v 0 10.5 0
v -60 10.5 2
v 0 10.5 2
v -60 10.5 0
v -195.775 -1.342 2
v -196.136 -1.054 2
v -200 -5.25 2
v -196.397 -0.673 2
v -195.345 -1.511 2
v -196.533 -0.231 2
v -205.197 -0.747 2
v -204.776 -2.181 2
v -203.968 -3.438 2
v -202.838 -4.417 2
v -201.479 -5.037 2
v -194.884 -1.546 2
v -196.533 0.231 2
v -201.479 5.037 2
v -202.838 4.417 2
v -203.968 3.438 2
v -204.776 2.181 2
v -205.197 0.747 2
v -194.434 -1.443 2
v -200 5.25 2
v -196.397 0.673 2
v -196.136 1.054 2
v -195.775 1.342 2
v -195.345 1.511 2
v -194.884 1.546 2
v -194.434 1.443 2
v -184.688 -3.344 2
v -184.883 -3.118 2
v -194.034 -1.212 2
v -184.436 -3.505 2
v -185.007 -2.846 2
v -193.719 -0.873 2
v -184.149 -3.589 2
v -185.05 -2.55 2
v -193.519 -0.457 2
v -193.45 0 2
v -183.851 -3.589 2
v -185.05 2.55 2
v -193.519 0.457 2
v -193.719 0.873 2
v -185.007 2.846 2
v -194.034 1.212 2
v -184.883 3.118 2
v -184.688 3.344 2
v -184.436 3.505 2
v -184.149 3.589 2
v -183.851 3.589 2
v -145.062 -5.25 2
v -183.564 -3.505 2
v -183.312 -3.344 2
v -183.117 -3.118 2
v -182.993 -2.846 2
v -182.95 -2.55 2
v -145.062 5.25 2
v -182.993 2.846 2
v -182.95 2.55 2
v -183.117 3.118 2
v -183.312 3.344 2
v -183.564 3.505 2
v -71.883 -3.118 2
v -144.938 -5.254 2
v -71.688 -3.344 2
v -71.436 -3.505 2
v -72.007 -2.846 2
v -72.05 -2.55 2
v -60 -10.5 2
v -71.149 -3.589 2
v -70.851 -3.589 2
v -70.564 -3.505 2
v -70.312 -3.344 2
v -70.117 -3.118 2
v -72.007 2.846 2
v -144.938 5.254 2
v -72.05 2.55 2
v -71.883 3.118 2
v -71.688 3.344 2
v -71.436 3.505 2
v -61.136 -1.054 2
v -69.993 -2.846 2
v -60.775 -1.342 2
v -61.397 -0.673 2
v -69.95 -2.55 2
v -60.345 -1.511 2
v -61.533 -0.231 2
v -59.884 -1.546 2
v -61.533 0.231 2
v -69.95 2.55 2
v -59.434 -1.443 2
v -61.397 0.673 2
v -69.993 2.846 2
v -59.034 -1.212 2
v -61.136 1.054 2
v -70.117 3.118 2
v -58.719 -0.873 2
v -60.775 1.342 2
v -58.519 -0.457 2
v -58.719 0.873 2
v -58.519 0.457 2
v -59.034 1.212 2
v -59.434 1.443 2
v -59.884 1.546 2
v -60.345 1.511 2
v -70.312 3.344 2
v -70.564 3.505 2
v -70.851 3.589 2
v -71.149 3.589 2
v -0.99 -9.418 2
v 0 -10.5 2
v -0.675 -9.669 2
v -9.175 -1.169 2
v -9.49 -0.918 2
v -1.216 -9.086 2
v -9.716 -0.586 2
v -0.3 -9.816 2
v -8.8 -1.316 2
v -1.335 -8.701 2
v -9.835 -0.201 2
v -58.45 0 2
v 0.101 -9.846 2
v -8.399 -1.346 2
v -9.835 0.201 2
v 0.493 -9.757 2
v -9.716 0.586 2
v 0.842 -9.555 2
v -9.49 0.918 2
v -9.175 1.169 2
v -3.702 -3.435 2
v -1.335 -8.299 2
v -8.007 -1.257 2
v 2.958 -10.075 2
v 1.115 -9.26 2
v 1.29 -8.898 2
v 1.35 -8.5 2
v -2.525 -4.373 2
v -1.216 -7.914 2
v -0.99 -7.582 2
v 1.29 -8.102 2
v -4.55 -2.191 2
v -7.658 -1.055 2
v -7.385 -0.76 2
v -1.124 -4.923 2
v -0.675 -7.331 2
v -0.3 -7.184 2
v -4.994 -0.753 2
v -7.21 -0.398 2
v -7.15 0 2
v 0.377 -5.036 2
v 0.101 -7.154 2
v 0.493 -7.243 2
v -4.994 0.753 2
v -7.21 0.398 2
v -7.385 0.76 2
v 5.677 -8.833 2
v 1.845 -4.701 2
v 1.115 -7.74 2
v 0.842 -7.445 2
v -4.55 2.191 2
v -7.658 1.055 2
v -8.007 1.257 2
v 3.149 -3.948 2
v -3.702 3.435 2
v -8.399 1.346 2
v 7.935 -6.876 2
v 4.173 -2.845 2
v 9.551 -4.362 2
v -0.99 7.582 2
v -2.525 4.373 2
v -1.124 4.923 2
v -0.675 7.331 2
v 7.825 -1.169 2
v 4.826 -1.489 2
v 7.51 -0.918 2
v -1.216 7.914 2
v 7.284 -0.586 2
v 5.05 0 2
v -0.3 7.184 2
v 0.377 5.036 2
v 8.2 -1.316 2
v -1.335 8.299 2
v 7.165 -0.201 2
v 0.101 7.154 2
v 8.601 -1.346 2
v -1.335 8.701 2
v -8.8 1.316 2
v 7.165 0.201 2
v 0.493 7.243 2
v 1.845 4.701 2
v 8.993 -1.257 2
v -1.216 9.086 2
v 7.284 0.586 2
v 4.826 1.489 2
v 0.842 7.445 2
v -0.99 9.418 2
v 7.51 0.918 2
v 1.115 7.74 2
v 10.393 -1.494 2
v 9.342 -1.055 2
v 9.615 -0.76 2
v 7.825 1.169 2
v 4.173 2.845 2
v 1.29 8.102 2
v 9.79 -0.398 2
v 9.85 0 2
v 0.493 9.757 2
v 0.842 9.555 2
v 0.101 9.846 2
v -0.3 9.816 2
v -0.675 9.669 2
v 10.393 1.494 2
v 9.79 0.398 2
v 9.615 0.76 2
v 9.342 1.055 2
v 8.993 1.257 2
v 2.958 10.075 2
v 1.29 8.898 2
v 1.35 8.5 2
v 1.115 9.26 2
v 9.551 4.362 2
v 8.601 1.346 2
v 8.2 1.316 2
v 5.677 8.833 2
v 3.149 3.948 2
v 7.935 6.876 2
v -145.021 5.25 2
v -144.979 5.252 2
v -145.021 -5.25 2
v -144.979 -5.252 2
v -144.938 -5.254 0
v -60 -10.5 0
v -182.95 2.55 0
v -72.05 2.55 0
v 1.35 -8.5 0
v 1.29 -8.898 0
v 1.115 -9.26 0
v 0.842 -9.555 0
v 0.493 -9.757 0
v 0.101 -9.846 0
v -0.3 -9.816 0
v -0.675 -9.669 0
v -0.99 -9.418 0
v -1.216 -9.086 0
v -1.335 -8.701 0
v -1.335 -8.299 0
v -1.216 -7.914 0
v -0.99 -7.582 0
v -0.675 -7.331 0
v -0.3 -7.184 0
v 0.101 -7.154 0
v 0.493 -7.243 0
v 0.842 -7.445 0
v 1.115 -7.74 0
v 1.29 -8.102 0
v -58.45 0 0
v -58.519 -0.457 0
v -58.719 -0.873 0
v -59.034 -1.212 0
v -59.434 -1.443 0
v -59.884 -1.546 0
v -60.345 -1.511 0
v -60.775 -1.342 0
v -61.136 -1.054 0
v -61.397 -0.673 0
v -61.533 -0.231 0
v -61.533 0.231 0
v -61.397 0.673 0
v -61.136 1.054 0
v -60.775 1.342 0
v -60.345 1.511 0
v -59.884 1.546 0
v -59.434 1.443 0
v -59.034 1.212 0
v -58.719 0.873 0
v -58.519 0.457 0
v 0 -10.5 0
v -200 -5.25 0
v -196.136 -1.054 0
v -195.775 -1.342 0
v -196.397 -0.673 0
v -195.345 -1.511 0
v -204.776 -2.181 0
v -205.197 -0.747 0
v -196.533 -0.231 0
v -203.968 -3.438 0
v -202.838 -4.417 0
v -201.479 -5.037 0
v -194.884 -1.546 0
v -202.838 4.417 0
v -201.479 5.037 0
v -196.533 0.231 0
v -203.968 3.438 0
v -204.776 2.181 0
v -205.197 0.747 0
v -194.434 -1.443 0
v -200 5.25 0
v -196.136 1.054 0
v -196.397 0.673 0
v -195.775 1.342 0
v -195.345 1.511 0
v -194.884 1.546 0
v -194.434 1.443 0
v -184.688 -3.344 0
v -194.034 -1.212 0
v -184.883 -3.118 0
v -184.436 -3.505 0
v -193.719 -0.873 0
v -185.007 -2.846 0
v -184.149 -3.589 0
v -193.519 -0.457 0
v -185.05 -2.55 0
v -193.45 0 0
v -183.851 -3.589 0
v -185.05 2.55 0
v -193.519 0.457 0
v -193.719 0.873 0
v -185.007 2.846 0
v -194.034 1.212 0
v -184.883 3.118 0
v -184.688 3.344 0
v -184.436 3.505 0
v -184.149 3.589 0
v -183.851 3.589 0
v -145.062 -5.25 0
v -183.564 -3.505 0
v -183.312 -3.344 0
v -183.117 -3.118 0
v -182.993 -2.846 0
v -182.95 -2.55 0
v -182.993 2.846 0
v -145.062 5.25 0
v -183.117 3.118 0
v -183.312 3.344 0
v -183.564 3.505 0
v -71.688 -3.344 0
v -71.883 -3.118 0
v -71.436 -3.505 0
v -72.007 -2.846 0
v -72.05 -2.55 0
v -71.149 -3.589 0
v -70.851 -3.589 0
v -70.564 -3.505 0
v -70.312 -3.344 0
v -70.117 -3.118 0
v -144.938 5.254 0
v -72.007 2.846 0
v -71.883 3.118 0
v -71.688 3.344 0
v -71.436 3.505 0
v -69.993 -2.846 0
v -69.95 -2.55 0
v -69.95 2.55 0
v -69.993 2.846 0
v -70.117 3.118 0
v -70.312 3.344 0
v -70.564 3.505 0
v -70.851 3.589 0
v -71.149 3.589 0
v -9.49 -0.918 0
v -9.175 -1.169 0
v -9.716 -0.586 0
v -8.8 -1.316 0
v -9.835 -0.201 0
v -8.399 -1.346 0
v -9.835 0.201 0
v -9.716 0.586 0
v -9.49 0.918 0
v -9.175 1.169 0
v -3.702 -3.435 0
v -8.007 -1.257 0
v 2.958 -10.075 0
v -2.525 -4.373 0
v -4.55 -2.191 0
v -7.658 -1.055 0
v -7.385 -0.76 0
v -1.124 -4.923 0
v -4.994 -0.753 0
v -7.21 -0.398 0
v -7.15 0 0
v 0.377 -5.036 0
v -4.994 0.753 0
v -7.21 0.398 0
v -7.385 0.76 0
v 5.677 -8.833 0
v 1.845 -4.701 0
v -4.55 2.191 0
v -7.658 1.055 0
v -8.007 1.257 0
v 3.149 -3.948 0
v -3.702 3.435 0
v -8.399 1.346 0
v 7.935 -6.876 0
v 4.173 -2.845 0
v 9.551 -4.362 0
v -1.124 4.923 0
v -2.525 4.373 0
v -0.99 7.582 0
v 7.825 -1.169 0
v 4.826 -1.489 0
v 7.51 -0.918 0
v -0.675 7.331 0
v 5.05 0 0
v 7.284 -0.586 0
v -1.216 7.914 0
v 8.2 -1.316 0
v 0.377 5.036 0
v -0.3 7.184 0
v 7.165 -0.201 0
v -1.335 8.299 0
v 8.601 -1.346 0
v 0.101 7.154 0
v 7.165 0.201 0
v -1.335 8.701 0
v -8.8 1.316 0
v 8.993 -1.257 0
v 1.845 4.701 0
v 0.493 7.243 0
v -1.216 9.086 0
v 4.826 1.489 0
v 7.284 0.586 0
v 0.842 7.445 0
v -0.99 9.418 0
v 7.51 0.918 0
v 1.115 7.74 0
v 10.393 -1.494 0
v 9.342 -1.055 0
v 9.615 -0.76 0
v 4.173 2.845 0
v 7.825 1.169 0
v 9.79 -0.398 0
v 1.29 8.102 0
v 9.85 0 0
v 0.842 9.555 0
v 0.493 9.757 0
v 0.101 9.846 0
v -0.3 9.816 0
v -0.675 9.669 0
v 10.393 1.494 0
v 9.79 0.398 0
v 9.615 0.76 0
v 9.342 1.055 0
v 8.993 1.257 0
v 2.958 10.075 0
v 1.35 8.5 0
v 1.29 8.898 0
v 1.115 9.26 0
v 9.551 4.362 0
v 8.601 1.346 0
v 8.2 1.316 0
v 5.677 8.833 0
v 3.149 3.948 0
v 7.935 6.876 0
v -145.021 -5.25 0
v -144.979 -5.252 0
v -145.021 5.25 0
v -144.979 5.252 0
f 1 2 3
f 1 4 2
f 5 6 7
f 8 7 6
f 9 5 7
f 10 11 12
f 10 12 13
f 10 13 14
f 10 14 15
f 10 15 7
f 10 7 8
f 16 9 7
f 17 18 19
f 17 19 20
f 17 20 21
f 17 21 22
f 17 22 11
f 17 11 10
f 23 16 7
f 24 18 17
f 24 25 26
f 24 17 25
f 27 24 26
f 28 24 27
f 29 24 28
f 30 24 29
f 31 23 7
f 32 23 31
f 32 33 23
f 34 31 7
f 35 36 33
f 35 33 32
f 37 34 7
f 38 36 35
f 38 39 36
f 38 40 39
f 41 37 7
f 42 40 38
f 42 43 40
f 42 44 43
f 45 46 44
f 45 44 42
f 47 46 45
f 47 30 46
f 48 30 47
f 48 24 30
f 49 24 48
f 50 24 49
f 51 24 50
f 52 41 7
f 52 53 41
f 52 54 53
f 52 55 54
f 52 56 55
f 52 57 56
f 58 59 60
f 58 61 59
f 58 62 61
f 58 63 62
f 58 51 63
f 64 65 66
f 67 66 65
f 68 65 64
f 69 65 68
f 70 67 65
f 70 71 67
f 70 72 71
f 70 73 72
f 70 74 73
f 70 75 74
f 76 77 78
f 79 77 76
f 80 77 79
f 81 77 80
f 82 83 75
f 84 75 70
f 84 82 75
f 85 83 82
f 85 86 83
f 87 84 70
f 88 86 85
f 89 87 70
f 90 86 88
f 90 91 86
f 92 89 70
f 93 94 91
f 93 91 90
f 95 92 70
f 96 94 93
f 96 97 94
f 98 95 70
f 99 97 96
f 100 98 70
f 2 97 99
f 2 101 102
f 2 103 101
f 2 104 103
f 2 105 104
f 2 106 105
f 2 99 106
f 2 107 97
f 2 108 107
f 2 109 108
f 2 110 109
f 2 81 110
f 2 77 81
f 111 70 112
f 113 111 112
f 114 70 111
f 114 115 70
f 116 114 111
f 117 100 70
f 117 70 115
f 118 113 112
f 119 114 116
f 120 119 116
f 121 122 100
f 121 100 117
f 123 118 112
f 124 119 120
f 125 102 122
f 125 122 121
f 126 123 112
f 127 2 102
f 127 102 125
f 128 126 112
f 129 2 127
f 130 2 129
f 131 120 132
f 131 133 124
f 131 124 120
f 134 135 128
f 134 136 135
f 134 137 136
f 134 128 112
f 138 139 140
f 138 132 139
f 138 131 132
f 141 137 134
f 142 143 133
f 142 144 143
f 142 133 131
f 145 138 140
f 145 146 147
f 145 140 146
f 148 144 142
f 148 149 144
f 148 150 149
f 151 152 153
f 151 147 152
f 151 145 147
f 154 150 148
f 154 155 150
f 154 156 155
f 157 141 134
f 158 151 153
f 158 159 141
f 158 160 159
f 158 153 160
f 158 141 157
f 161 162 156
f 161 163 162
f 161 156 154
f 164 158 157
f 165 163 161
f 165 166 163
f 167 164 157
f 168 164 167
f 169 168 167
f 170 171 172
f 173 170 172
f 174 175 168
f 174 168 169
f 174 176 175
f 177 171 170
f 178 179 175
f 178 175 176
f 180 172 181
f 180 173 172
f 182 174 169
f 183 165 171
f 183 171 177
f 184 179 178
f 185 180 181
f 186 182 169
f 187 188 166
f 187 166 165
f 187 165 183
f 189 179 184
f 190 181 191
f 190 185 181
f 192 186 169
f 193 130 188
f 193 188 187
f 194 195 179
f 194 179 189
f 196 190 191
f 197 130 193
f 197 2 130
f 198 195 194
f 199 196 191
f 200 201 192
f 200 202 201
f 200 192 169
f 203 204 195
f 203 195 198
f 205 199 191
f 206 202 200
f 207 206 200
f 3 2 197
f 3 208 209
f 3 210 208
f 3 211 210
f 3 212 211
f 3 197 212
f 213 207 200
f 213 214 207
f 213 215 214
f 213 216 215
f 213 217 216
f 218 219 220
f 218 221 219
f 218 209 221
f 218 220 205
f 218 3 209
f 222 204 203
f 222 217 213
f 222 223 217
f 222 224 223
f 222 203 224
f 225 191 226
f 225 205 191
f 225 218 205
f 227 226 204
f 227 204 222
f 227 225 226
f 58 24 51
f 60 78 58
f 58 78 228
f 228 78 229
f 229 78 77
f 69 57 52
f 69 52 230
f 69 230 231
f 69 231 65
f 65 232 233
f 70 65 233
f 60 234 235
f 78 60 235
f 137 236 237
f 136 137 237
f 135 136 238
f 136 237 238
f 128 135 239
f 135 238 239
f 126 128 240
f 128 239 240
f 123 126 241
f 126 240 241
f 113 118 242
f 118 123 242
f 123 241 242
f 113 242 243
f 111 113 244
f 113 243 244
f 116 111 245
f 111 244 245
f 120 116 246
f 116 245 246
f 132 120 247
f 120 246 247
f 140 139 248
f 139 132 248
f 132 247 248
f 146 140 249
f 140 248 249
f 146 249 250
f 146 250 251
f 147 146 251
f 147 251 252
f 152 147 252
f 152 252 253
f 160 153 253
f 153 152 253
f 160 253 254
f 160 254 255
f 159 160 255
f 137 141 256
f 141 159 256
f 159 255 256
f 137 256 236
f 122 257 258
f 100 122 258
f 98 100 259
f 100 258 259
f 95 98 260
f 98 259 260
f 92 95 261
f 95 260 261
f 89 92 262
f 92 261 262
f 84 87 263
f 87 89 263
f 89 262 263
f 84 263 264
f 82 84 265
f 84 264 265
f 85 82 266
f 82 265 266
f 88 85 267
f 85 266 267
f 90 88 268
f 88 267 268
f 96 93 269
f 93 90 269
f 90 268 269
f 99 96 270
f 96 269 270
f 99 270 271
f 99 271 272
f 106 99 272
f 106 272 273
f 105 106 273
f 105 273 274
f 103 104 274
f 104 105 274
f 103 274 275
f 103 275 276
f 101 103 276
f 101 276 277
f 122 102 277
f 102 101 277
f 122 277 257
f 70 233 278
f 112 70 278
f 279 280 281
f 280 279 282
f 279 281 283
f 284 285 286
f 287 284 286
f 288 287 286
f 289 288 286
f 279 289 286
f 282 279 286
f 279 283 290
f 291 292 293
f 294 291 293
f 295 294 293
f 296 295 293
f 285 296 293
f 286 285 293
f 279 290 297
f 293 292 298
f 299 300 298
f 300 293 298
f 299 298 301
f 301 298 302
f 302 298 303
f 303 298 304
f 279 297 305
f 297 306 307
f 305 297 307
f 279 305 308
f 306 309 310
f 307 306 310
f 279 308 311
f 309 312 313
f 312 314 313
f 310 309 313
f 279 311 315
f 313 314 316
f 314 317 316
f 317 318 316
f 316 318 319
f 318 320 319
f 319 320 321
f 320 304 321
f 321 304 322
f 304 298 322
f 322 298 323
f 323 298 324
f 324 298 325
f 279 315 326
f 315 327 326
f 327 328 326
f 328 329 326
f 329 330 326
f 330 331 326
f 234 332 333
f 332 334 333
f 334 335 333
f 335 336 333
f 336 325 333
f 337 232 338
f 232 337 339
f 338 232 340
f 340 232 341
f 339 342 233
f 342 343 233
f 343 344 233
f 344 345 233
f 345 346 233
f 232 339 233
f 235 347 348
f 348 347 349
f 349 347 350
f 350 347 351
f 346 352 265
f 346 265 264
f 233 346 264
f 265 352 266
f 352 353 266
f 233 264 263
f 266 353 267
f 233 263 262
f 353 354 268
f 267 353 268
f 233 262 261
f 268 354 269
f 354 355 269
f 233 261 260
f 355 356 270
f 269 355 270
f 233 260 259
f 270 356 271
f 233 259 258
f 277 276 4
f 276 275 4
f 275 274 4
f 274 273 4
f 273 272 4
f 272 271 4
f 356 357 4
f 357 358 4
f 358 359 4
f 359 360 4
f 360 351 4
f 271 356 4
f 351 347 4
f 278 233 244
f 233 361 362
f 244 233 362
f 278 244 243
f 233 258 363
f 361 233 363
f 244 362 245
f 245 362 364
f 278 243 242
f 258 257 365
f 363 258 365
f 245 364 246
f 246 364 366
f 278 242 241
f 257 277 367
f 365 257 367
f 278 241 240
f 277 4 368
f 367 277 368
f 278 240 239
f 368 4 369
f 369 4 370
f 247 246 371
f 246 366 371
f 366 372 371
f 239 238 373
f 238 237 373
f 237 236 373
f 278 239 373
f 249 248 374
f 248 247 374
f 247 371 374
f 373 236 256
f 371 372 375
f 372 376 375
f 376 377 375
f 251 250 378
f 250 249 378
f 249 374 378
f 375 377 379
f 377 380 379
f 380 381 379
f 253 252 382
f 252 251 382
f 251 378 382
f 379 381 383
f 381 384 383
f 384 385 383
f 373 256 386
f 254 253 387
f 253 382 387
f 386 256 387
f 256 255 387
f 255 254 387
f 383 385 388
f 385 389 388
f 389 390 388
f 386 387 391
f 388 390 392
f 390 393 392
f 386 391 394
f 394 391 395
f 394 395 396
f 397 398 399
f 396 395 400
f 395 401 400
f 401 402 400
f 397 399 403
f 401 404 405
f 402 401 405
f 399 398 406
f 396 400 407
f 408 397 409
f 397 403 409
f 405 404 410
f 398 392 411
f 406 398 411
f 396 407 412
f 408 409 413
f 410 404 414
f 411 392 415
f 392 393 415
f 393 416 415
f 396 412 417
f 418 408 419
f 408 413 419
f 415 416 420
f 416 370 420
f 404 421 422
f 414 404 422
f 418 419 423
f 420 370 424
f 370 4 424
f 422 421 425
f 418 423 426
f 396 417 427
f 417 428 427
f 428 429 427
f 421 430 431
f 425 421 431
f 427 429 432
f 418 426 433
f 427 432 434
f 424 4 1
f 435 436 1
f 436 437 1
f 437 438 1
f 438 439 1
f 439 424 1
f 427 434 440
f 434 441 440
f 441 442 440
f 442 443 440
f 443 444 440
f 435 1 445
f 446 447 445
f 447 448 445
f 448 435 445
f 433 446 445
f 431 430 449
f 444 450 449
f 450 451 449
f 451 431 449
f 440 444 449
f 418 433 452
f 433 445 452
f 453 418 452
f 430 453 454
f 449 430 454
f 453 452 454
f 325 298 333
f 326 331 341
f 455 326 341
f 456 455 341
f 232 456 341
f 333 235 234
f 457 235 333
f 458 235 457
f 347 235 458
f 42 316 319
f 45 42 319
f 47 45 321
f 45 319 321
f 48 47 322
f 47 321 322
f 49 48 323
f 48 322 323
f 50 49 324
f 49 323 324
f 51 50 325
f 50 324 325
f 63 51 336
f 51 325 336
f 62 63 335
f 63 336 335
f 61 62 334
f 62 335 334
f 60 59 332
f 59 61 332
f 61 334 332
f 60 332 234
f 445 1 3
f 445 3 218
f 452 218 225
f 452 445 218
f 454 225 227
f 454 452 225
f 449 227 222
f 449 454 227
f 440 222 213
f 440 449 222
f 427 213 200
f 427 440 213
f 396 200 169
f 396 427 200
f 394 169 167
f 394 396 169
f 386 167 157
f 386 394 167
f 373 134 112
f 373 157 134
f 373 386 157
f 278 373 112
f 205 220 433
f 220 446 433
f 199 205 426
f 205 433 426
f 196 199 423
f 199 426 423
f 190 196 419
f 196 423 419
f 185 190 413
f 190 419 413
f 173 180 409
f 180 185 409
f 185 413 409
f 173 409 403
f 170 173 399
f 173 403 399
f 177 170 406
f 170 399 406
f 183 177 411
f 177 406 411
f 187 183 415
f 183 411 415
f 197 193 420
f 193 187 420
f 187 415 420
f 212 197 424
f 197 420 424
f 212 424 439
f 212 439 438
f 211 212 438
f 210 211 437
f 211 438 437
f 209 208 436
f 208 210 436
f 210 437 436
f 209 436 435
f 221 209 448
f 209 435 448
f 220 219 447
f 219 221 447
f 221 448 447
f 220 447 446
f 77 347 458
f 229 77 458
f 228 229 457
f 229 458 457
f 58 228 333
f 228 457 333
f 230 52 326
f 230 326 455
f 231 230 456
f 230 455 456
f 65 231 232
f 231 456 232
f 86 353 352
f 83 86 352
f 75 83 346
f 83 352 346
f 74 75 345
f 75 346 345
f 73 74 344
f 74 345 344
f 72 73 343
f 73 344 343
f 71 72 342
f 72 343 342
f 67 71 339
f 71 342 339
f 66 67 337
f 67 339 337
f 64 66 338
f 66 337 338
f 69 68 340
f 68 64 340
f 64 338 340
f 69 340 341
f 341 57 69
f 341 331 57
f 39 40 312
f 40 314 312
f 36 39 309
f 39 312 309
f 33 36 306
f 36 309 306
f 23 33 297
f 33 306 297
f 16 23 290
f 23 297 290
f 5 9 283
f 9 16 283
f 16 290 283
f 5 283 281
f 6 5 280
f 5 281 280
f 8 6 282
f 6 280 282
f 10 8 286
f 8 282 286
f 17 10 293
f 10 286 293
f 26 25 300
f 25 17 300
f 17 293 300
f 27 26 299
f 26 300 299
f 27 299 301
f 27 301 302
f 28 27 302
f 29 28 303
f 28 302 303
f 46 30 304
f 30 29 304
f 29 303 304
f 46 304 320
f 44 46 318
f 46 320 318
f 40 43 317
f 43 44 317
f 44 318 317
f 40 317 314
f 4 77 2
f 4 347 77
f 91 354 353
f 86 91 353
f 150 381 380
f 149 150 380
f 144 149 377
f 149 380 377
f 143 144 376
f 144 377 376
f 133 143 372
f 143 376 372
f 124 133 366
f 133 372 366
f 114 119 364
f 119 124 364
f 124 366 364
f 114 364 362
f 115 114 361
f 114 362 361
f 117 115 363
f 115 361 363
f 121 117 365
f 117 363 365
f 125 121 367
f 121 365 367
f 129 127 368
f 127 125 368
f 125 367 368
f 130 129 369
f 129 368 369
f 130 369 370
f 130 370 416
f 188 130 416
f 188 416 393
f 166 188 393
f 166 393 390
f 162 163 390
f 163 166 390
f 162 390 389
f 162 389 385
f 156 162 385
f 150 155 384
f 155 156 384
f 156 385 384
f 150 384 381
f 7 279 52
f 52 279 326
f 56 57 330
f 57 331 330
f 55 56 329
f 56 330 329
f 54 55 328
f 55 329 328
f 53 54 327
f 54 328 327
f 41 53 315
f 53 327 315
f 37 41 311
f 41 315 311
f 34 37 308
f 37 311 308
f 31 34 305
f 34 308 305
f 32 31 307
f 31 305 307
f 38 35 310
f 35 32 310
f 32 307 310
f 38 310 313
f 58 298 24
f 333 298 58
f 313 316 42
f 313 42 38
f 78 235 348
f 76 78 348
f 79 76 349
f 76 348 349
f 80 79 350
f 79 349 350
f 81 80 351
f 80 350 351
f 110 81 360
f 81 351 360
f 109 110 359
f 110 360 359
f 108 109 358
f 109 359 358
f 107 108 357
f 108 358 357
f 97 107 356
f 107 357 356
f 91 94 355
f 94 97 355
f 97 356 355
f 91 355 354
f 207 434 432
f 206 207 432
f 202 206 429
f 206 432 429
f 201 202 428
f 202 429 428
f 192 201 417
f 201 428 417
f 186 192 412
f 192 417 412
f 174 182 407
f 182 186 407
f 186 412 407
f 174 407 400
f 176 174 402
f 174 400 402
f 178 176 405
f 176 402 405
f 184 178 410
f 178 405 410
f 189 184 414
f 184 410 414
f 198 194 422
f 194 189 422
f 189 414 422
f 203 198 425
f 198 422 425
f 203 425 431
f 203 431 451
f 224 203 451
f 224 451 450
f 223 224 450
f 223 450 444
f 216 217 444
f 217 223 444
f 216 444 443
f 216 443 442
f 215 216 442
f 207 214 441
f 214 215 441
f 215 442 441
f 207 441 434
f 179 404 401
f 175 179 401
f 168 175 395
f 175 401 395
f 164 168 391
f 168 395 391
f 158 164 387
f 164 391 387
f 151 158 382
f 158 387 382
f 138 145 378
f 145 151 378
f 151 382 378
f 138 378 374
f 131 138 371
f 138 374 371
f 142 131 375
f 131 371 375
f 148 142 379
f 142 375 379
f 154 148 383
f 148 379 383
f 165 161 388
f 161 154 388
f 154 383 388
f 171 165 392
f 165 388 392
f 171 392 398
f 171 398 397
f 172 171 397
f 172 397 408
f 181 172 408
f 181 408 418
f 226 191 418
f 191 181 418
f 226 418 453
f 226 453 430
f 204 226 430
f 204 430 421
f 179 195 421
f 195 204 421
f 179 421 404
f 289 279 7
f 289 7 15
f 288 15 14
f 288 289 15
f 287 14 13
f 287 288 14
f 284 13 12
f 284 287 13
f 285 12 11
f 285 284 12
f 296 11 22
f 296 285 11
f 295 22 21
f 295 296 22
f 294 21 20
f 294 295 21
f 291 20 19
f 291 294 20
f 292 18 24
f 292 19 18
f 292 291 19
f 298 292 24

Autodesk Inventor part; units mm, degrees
ref_plane "YZ Plane" through (0, 0, 0) normal (1, 0, 0) x (0, 1, 0)
ref_plane "XZ Plane" through (0, 0, 0) normal (0, 1, 0) x (-1, 0, 0)
ref_plane "XY Plane" through (0, 0, 0) normal (0, 0, 1) x (1, 0, 0)
sketch "スケッチ1" plane through (0, 0, 0) normal (0, 0, 1) x (1, 0, 0)
  circle A0 centre (0, 0) radius 10.5 construction
  line L0 (0, 10.5) -> (-200, 10.5) construction
  line L1 (-200, 10.5) -> (-200, -10.5) construction
  line L2 (-200, -10.5) -> (0, -10.5) construction
  circle A1 centre (-195, 0) radius 1.55
  line L3 (-185, 2.5) -> (-70, 2.5) construction
  line L4 (-70, 2.5) -> (-70, -2.5) construction
  line L5 (-70, -2.5) -> (-185, -2.5) construction
  line L6 (-185, -2.5) -> (-185, 2.5) construction
  line L7 (-127.5, 2.5) -> (-127.5, -2.5) construction
  circle A2 centre (-60, 0) radius 1.55
  line L8 (-12, 21.3027) -> (-12, -27.3903) construction
  line L9 (-69.95, 2.55) -> (-185.05, 2.55) construction
  line L10 (-185.05, 2.55) -> (-185.05, -2.55) construction
  line L11 (-185.05, -2.55) -> (-69.95, -2.55) construction
  line L12 (-69.95, -2.55) -> (-69.95, 2.55) construction
  circle A3 centre (-184, 2.55) radius 1.05 construction
  line L13 (-185, 0) -> (-127.5, 0) construction
  line L14 (-185.05, 2.55) -> (-185.05, -2.55)
  arc A4 (-182.95, 2.55) -> (-185.05, 2.55) centre (-184, 2.55) ccw
  line L15 (-182.95, 2.55) -> (-72.05, 2.55)
  arc A5 (-69.95, 2.55) -> (-72.05, 2.55) centre (-71, 2.55) ccw
  line L16 (-69.95, 2.55) -> (-69.95, -2.55)
  arc A6 (-185.05, -2.55) -> (-182.95, -2.55) centre (-184, -2.55) ccw
  line L17 (-182.95, -2.55) -> (-72.05, -2.55)
  arc A7 (-72.05, -2.55) -> (-69.95, -2.55) centre (-71, -2.55) ccw
  circle A8 centre (0, 8.5) radius 1.35
  circle A9 centre (0, 0) radius 5.05
  circle A10 centre (-8.5, 0) radius 1.35
  circle A11 centre (0, -8.5) radius 1.35
  circle A12 centre (8.5, 0) radius 1.35
  line L18 (-60, 10.5) -> (0, 10.5)
  line L19 (-60, -10.5) -> (0, -10.5)
  arc A13 (0, -10.5) -> (0, 10.5) centre (0, 0) ccw
  circle A14 centre (-195, 0) radius 5 construction
  arc A15 (-200, 5.25) -> (-200, -5.25) centre (-200, 0) ccw
  line L20 (-200, 5.25) -> (-145, 5.25)
  line L21 (-145, 5.25) -> (-60, 10.5)
  line L22 (-200, -5.25) -> (-145, -5.25)
  line L23 (-145, -5.25) -> (-60, -10.5)
  dimension "d9" = 2.1
  dimension "d0" = 200
  dimension "d1" = 3.1
  dimension "d2" = 21
  dimension "d3" = 10
  dimension "d4" = 5
  dimension "d5" = 12
  dimension "d6" = 135
  dimension "d7" = 5
  dimension "d8" = 0.05
  dimension "d10" = 2.7
  dimension "d11" = 8.5
  dimension "d12" = 10.1
  dimension "d15" = 360
  dimension "d20" = 5.25
  dimension "d21" = 50
extrude "押し出し1" add sketch "スケッチ1" along normal blind 2
fillet "フィレット1" radius 2 2 edges at (-145, -5.25, 1) (-145, 5.25, 1)
equation "\"H_head\" = 28.5"
equation "\"H_leg\" = 199.5"
equation "\"足の面積\" = 12720.125"
equation "\"現在の面積\" = 11560"
equation "\"足_短辺\" = 68"
equation "\"円柱\" = 313.5"
equation "\"胴体中心から手先\" = 342"
equation "\"H_leg_1\" = 186.2"
equation "\"H_leg_MAX\" = 399"
equation "\"H_head_1\" = 26.6"
equation "\"H_head_MAX\" = 142.5"
properties part number "ForeArm_outside_frame" material "GFRP"
